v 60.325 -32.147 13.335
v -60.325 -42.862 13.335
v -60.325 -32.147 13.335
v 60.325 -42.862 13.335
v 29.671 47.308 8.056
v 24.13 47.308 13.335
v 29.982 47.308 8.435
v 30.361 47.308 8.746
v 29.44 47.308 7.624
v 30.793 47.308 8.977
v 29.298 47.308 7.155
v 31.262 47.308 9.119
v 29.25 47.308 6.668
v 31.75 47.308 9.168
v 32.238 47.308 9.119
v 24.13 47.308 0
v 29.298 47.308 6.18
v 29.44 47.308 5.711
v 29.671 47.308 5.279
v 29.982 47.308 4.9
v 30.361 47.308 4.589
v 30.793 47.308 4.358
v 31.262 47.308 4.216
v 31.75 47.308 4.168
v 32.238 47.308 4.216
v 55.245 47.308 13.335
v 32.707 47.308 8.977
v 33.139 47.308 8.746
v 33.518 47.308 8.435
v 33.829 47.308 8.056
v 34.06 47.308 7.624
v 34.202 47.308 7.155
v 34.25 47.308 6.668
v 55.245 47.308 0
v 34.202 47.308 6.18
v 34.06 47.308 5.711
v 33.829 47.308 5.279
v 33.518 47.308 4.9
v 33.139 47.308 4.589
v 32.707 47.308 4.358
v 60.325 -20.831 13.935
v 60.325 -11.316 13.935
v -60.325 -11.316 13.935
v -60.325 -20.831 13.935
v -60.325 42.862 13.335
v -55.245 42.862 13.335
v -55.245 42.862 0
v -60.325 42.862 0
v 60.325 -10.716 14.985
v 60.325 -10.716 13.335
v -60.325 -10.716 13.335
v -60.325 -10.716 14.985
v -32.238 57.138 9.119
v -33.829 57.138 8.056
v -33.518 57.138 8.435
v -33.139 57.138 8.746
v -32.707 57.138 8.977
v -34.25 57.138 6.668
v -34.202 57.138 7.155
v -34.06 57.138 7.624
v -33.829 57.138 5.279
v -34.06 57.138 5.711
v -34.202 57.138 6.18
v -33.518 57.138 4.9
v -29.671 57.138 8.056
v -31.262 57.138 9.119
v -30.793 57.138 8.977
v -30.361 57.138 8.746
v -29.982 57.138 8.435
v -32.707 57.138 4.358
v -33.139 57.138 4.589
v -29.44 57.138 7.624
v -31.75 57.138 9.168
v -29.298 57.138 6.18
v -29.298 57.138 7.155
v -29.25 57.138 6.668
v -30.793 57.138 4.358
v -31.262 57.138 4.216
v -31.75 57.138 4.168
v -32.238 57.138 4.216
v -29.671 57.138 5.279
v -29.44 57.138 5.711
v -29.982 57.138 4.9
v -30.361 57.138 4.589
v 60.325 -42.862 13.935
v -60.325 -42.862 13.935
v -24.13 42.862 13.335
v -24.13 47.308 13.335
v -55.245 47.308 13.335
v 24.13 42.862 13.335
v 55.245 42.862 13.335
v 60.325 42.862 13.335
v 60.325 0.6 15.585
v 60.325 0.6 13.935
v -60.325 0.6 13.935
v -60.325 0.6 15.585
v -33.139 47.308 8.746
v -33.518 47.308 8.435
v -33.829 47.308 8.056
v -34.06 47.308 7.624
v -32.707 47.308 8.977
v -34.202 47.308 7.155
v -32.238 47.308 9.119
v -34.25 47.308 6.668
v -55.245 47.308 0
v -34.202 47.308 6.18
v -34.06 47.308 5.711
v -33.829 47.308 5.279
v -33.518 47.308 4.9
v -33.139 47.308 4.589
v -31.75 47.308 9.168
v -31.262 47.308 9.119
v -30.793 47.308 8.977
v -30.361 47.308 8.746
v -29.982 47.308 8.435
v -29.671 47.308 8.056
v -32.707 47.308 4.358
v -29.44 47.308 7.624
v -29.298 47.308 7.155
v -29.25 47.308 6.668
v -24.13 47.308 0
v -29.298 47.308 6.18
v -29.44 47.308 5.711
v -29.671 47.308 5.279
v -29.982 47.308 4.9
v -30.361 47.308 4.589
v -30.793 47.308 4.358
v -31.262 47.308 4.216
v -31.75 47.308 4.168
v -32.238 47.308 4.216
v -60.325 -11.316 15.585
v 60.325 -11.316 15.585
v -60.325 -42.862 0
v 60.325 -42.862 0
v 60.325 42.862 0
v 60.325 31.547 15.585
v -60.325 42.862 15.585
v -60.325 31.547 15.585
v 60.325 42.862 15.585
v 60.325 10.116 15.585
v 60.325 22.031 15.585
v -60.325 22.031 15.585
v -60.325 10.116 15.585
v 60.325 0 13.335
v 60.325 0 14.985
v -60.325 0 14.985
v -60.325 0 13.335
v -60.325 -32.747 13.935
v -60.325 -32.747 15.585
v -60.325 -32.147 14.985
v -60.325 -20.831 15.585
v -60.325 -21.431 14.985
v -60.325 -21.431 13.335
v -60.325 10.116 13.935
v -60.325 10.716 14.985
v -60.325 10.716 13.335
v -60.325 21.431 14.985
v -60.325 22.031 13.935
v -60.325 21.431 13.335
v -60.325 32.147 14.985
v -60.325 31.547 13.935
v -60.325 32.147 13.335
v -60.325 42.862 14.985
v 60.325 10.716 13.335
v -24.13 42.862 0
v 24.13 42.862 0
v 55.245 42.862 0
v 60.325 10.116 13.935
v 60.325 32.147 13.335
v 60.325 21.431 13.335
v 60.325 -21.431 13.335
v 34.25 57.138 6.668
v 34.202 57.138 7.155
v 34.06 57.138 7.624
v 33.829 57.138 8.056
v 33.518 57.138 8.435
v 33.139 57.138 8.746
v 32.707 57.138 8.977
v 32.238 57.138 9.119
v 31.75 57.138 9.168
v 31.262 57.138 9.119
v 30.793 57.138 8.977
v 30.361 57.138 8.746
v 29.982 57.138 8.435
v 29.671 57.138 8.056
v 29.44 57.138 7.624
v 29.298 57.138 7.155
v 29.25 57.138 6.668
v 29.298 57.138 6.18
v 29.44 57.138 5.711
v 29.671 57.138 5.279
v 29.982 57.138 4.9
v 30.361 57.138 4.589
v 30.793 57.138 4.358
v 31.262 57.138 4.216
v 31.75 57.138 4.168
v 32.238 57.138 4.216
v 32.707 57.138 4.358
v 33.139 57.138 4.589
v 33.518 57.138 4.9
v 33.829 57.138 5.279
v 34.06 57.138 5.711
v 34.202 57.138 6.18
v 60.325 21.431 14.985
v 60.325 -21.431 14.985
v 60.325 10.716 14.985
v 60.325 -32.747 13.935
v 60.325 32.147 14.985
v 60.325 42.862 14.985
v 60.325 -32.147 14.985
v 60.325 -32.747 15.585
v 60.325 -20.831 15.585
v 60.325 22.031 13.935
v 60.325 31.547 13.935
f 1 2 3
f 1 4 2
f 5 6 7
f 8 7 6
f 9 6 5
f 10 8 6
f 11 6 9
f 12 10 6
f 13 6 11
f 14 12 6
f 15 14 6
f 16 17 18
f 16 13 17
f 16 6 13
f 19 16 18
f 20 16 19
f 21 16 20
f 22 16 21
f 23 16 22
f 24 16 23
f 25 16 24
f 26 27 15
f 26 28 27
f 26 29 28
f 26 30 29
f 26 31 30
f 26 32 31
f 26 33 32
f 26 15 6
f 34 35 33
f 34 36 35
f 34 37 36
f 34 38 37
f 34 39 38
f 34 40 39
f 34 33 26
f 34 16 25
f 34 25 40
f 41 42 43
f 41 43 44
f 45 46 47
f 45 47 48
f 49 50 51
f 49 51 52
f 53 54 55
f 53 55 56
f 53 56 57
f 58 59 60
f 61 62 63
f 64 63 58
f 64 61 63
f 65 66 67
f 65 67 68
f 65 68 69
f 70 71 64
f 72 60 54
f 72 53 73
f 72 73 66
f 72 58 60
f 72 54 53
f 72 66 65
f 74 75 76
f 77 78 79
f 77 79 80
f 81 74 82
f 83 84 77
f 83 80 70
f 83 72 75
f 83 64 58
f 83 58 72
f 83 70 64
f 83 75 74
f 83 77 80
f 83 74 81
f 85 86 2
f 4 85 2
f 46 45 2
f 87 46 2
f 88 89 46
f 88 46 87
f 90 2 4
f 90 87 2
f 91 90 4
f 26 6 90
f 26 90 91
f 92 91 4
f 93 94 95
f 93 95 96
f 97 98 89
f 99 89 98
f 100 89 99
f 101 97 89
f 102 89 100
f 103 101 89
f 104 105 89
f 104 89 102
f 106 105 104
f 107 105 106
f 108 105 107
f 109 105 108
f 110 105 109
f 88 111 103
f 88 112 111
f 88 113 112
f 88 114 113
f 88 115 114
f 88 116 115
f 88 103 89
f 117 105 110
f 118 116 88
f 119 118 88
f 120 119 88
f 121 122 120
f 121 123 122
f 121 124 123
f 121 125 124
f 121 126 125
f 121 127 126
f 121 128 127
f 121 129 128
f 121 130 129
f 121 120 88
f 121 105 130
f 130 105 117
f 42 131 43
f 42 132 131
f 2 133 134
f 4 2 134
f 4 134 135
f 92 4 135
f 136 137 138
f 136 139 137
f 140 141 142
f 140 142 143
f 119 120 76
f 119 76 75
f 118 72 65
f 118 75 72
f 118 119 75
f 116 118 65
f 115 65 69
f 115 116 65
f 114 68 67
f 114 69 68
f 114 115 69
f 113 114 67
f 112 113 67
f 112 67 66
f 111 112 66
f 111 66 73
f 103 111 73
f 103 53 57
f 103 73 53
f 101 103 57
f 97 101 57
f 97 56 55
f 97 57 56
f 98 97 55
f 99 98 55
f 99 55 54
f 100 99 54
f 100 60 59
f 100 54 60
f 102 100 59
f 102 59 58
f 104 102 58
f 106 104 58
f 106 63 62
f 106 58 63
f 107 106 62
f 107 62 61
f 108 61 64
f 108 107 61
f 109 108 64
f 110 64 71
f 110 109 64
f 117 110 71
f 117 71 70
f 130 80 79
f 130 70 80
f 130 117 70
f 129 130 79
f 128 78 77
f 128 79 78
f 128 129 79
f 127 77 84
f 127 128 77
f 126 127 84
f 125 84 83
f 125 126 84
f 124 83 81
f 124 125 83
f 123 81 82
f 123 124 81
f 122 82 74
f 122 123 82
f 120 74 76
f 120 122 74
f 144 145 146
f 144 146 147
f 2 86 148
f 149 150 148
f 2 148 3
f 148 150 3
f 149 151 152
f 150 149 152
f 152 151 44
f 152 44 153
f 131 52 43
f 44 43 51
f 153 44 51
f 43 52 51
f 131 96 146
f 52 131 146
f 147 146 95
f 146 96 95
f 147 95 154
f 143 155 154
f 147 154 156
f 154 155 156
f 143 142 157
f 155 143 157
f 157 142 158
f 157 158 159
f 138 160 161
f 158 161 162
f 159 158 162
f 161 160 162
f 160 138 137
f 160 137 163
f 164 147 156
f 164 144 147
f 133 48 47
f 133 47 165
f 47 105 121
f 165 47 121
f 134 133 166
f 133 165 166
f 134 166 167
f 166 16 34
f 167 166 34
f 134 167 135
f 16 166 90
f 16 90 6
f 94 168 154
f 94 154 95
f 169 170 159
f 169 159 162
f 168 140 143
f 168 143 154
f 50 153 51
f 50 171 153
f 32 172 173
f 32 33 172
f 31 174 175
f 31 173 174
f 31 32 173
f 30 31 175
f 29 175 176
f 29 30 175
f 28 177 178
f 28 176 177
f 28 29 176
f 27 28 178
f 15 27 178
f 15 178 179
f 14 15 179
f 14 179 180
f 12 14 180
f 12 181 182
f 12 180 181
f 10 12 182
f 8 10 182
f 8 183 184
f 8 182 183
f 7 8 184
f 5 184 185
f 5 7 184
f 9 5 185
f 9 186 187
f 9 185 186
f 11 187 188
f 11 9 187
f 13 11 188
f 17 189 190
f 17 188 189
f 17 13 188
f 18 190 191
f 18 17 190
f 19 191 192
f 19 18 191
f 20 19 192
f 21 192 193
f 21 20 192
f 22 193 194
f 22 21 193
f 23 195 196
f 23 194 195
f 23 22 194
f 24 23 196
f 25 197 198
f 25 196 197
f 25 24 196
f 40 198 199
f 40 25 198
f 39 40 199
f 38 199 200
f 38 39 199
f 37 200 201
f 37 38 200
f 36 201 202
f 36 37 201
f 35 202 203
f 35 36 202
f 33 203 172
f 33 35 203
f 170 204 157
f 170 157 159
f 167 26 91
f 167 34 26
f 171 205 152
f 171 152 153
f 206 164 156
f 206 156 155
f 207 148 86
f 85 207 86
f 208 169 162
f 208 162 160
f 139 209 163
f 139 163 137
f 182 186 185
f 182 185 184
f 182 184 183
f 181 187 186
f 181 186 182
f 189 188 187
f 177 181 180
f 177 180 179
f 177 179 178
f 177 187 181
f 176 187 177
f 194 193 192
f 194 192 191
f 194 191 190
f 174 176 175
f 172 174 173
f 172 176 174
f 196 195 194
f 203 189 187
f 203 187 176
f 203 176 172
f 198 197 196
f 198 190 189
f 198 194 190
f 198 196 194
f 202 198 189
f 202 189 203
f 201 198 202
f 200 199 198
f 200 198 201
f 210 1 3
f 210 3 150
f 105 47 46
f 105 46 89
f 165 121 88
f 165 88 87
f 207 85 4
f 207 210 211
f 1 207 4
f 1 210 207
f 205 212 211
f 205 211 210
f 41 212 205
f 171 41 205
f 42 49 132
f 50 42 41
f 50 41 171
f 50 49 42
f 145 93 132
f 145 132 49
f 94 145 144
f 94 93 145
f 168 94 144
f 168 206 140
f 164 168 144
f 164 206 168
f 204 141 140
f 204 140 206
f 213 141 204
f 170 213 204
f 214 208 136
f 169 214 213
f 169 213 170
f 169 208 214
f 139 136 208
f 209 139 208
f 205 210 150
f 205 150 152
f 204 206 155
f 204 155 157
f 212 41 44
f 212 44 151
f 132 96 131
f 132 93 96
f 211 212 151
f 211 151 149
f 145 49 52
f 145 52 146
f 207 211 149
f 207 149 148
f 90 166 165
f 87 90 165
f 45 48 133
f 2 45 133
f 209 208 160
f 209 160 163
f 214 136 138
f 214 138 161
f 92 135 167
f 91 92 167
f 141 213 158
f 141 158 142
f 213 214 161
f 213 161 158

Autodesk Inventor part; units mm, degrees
ref_plane "YZ Plane" through (0, 0, 0) normal (1, 0, 0) x (0, 1, 0)
ref_plane "XZ Plane" through (0, 0, 0) normal (0, 1, 0) x (-1, 0, 0)
sketch "Sketch1" plane through (0, 0, 0) normal (0, 0, 1) x (1, 0, 0)
  line L0 (-60.325, -42.8625) -> (60.325, -42.8625)
  line L1 (60.325, -42.8625) -> (60.325, 42.8625)
  line L2 (60.325, 42.8625) -> (-60.325, 42.8625)
  line L3 (-60.325, 42.8625) -> (-60.325, -42.8625)
  line L4 (-60.325, -42.8625) -> (60.325, 42.8625) construction
  line L5 (60.325, -42.8625) -> (-60.325, 42.8625) construction
  line L6 (-55.245, 42.8625) -> (-55.245, 47.3075)
  line L7 (-55.245, 47.3075) -> (-24.13, 47.3075)
  line L8 (-24.13, 47.3075) -> (-24.13, 42.8625)
  line L9 (24.13, 42.8625) -> (24.13, 47.3075)
  line L10 (24.13, 47.3075) -> (55.245, 47.3075)
  line L11 (55.245, 47.3075) -> (55.245, 42.8625)
  point P0 (0, 0)
  dimension "d0" = 120.65
  dimension "d1" = 85.725
  dimension "d2" = 4.445
  dimension "d3" = 5.08
  dimension "d4" = 5.08
  dimension "d5" = 31.115
extrude "Extrusion1" add sketch "Sketch1" along normal blind 13.335
ref_plane "Work Plane1" through (-60.325, 57.1375, 0) normal (0, -1, 0) x (1, 0, 0)
sketch "Sketch2" plane through (-55.245, 47.3075, 0) normal (0, 1, 0) x (1, 0, 0)
  line L0 (31.115, 0) -> (31.115, -13.335) construction
  line L1 (79.375, 0) -> (79.375, -13.335) construction
  line L2 (31.115, -6.6675) -> (23.495, -6.6675) construction
  line L3 (79.375, -6.6675) -> (86.995, -6.6675) construction
  circle A0 centre (23.495, -6.6675) radius 2.5
  circle A1 centre (86.995, -6.6675) radius 2.5
  point P0 (55.245, 0)
  dimension "d8" = 63.5
  dimension "d9" = 5
extrude "Extrusion2" add sketch "Sketch2" along normal up to surface (9.83 mm away)
sketch "Sketch3" plane through (60.325, -42.8625, 0) normal (1, 0, 0) x (0, 0, -1)
  line L0 (0, 0) -> (-13.335, 0) construction
  line L1 (-13.335, 0) -> (-13.335, 10.7156)
  line L2 (-13.335, 10.7156) -> (-14.985, 10.7156)
  line L3 (-14.985, 10.7156) -> (-14.985, 21.4313)
  line L4 (-14.985, 21.4313) -> (-13.335, 21.4313)
  line L5 (-13.335, 21.4313) -> (-13.335, 32.1469)
  line L6 (-13.335, 32.1469) -> (-14.985, 32.1469)
  line L7 (-14.985, 32.1469) -> (-14.985, 42.8625)
  line L8 (-14.985, 42.8625) -> (-13.335, 42.8625)
  line L9 (-13.335, 42.8625) -> (-13.335, 53.5781)
  line L10 (-13.335, 53.5781) -> (-14.985, 53.5781)
  line L11 (-14.985, 53.5781) -> (-14.985, 64.2938)
  line L12 (-14.985, 64.2938) -> (-13.335, 64.2938)
  line L13 (-13.335, 64.2938) -> (-13.335, 75.0094)
  line L14 (-13.335, 75.0094) -> (-14.985, 75.0094)
  line L15 (-14.985, 75.0094) -> (-14.985, 85.725)
  line L16 (-15.585, 85.725) -> (-15.585, 74.4094)
  line L17 (-15.585, 74.4094) -> (-13.935, 74.4094)
  line L18 (-13.935, 74.4094) -> (-13.935, 64.8938)
  line L19 (-13.935, 64.8938) -> (-15.585, 64.8938)
  line L20 (-15.585, 64.8938) -> (-15.585, 52.9781)
  line L21 (-15.585, 52.9781) -> (-13.935, 52.9781)
  line L22 (-13.935, 52.9781) -> (-13.935, 43.4625)
  line L23 (-13.935, 43.4625) -> (-15.585, 43.4625)
  line L24 (-15.585, 43.4625) -> (-15.585, 31.5469)
  line L25 (-15.585, 31.5469) -> (-13.935, 31.5469)
  line L26 (-13.935, 31.5469) -> (-13.935, 22.0313)
  line L27 (-13.935, 22.0313) -> (-15.585, 22.0313)
  line L28 (-15.585, 22.0313) -> (-15.585, 10.1156)
  line L29 (-15.585, 10.1156) -> (-13.935, 10.1156)
  line L30 (-13.935, 10.1156) -> (-13.935, 0)
  line L31 (0, 85.725) -> (-13.335, 85.725) construction
  line L32 (-13.335, 85.725) -> (-14.985, 85.725) construction
  line L33 (-13.935, 0) -> (-13.335, 0)
  line L34 (-14.985, 85.725) -> (-15.585, 85.725)
  point P0 (0, 42.8625)
  dimension "d14" = 2.25
  dimension "d15" = 0.6
extrude "Extrusion3" add sketch "Sketch3" against normal up to surface (120.65 mm away) separate body
thread "Thread1" size "M5x0.8" class "6g" standard "ANSI Metric M Profile" full length
thread "Thread2" size "M5x0.8" class "6g" standard "ANSI Metric M Profile" full length
properties part number "Cell"
